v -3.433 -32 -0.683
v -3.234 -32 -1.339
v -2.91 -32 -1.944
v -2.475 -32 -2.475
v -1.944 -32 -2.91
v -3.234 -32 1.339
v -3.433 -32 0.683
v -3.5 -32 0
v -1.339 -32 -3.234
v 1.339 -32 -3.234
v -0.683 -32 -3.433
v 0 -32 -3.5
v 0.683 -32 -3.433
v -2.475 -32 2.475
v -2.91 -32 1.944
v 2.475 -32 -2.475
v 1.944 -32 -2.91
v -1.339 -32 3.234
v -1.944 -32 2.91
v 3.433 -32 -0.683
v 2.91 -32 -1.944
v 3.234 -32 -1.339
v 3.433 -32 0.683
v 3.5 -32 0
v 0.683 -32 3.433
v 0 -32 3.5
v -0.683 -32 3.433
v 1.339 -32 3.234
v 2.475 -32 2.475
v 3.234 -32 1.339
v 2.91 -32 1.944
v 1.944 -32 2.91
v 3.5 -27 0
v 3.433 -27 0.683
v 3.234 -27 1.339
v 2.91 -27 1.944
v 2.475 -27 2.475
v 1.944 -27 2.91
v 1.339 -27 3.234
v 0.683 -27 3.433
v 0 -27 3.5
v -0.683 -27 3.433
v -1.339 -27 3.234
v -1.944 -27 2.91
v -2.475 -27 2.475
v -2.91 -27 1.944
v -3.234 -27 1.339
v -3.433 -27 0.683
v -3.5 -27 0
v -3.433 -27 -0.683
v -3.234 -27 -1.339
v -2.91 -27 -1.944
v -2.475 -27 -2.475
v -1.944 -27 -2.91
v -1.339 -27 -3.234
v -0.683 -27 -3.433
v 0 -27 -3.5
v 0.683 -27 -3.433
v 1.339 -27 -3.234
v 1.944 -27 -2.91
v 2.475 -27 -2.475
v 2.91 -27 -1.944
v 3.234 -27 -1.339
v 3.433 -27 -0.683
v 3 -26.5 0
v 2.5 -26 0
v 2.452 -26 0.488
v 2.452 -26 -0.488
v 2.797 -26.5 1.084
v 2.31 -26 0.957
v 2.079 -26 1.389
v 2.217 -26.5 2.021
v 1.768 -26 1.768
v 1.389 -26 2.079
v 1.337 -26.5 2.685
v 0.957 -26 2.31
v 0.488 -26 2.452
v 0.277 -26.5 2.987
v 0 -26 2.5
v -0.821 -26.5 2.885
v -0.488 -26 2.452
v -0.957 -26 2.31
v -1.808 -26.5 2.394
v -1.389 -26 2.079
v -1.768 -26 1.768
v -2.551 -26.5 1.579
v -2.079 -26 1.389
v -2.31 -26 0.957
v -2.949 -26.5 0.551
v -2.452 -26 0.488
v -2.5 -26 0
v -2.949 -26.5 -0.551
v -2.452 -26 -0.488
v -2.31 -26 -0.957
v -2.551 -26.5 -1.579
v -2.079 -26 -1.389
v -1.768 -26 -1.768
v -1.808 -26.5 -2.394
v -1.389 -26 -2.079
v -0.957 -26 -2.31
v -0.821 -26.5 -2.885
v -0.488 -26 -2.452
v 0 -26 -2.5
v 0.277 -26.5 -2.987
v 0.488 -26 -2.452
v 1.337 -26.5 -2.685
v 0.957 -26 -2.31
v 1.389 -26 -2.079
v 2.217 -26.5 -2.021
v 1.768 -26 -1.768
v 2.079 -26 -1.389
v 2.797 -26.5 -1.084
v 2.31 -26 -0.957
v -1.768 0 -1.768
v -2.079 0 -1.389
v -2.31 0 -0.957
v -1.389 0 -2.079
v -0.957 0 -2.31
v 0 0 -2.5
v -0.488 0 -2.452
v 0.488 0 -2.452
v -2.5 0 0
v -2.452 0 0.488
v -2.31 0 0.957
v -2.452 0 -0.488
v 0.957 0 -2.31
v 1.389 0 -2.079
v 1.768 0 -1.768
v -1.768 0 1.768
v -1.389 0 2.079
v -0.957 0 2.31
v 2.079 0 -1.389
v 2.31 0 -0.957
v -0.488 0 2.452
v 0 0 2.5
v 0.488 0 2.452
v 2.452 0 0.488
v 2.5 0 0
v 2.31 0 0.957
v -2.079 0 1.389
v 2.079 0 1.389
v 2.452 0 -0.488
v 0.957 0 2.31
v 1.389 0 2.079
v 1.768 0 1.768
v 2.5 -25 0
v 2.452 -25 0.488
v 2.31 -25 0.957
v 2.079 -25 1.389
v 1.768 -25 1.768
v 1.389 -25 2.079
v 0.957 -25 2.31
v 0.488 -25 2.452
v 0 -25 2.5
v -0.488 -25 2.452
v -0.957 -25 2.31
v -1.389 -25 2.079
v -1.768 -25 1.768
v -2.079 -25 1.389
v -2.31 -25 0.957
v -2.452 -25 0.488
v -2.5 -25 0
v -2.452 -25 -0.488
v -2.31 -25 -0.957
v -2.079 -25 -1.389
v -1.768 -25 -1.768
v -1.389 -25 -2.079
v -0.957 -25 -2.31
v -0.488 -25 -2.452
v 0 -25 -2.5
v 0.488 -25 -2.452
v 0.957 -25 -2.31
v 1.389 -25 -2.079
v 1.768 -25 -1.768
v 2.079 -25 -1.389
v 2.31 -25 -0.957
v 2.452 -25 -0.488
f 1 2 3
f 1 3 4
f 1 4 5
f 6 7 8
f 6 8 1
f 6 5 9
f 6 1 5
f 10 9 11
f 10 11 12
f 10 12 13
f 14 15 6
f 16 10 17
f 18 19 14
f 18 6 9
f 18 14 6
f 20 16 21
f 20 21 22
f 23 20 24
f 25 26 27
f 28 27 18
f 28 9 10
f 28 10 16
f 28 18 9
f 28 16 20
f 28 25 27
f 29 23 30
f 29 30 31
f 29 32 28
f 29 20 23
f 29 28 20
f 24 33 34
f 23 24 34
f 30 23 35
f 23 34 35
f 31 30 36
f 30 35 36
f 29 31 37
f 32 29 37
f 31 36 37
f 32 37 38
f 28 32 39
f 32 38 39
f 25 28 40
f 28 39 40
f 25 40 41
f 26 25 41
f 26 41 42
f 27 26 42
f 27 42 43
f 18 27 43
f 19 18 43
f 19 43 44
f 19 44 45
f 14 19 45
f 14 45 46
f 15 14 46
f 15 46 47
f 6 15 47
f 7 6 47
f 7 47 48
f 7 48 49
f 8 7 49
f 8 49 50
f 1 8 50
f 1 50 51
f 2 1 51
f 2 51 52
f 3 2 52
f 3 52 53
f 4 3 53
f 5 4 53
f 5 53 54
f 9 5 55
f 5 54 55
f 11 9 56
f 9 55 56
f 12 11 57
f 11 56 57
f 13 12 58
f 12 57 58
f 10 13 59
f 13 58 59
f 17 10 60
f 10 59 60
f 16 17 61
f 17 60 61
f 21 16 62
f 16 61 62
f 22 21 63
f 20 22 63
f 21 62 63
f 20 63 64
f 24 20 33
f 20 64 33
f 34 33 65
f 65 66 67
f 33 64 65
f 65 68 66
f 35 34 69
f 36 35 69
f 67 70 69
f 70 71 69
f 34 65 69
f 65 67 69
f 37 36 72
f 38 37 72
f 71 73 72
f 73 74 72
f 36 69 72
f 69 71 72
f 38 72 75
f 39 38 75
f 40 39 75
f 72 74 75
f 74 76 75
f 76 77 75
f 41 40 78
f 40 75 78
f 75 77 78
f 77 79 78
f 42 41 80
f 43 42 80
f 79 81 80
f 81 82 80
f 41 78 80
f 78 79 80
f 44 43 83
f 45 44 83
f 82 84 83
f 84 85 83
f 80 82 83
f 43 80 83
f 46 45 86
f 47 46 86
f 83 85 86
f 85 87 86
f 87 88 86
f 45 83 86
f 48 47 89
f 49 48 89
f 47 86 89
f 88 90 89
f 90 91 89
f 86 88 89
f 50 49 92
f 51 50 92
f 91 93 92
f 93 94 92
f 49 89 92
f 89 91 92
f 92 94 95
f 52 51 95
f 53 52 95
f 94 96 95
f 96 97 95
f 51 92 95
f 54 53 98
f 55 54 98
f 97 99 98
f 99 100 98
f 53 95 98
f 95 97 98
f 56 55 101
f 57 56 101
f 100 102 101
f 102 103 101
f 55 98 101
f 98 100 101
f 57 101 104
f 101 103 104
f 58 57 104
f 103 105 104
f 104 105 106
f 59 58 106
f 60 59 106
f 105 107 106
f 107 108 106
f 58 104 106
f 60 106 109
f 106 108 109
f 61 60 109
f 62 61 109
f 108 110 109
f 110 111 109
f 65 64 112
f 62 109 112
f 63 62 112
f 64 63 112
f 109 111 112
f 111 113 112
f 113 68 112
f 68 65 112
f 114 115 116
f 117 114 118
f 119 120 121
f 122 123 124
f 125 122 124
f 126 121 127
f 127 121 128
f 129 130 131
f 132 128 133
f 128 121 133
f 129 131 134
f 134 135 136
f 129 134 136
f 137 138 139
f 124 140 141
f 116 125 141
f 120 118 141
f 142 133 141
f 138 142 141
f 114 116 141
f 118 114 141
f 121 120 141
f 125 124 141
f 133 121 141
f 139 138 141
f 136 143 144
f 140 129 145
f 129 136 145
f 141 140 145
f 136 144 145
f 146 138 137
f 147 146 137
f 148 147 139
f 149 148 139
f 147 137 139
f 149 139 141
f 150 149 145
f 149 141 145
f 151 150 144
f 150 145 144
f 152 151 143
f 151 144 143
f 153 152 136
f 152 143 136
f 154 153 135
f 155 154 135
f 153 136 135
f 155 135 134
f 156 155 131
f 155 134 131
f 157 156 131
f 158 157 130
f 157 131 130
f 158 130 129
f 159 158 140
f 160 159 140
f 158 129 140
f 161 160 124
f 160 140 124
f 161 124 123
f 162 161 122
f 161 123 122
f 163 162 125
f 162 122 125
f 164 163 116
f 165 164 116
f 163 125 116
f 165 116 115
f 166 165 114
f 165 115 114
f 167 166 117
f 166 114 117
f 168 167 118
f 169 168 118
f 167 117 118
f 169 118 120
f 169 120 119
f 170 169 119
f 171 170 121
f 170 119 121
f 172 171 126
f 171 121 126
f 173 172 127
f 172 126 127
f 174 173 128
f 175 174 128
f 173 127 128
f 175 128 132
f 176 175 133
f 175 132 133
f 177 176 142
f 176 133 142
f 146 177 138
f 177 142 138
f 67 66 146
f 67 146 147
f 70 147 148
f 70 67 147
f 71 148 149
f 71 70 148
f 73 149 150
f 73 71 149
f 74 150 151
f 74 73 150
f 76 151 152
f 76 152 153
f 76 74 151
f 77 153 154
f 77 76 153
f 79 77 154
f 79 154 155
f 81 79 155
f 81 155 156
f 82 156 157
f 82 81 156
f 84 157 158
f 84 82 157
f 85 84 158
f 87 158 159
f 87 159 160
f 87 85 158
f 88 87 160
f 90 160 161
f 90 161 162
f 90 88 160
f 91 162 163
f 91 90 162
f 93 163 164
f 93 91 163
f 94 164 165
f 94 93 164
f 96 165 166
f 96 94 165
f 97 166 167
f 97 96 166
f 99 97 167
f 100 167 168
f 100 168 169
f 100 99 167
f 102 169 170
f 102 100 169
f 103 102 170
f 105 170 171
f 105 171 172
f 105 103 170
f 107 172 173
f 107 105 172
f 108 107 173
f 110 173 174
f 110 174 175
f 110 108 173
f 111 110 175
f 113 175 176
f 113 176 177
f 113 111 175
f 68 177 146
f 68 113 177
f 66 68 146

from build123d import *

# Parameters (mm, degrees)
F0_R        = 2.5
F1_DEPTH    = 25
F2_R        = 3.5
F2_R_2      = 2.5
F3_DEPTH    = 7
F4_S5_R     = 2.5
F4_T6_DEPTH = 7


# Not quite as in the source:
# - a fillet or chamfer that OpenCascade refuses, or shapes differently, is made with other operations: its cross-section is extruded or revolved along the edge and cut away or added


with BuildPart() as f1:
    # F0 (on Front) → F1 (new body)
    with BuildSketch(Plane.XZ):
        Circle(F0_R)
    extrude(amount=F1_DEPTH)

    # F2 (on face) → F3 (join)
    with BuildSketch(Plane.XZ.offset(25)):
        Circle(F2_R)
        Circle(F2_R_2, mode=Mode.SUBTRACT)
        Circle(F2_R_2)
    extrude(amount=F3_DEPTH)

    # F4: chamfer of 2 on 1 edges, made by hand


with BuildPart() as f4_tool2:
    # F4_s3 → F4_t4 (revolve)
    with BuildSketch(Plane.XY):
        Polygon((3.5, -27), (1.5, -25), (3.5, -25), align=None)
    revolve(axis=Axis((0, -25, 0), (0, -1, 0)))

    # F4_s5 → F4_t6 (cut, symmetric)
    with BuildSketch(Plane.XZ.offset(26)):
        Circle(F4_S5_R)
    extrude(amount=F4_T6_DEPTH, both=True, mode=Mode.SUBTRACT)


with BuildPart() as f1_1:
    add(f1.part)

    # F4_t1: cut F4_tool2
    add(f4_tool2.part, mode=Mode.SUBTRACT)


solid = f1_1.part
